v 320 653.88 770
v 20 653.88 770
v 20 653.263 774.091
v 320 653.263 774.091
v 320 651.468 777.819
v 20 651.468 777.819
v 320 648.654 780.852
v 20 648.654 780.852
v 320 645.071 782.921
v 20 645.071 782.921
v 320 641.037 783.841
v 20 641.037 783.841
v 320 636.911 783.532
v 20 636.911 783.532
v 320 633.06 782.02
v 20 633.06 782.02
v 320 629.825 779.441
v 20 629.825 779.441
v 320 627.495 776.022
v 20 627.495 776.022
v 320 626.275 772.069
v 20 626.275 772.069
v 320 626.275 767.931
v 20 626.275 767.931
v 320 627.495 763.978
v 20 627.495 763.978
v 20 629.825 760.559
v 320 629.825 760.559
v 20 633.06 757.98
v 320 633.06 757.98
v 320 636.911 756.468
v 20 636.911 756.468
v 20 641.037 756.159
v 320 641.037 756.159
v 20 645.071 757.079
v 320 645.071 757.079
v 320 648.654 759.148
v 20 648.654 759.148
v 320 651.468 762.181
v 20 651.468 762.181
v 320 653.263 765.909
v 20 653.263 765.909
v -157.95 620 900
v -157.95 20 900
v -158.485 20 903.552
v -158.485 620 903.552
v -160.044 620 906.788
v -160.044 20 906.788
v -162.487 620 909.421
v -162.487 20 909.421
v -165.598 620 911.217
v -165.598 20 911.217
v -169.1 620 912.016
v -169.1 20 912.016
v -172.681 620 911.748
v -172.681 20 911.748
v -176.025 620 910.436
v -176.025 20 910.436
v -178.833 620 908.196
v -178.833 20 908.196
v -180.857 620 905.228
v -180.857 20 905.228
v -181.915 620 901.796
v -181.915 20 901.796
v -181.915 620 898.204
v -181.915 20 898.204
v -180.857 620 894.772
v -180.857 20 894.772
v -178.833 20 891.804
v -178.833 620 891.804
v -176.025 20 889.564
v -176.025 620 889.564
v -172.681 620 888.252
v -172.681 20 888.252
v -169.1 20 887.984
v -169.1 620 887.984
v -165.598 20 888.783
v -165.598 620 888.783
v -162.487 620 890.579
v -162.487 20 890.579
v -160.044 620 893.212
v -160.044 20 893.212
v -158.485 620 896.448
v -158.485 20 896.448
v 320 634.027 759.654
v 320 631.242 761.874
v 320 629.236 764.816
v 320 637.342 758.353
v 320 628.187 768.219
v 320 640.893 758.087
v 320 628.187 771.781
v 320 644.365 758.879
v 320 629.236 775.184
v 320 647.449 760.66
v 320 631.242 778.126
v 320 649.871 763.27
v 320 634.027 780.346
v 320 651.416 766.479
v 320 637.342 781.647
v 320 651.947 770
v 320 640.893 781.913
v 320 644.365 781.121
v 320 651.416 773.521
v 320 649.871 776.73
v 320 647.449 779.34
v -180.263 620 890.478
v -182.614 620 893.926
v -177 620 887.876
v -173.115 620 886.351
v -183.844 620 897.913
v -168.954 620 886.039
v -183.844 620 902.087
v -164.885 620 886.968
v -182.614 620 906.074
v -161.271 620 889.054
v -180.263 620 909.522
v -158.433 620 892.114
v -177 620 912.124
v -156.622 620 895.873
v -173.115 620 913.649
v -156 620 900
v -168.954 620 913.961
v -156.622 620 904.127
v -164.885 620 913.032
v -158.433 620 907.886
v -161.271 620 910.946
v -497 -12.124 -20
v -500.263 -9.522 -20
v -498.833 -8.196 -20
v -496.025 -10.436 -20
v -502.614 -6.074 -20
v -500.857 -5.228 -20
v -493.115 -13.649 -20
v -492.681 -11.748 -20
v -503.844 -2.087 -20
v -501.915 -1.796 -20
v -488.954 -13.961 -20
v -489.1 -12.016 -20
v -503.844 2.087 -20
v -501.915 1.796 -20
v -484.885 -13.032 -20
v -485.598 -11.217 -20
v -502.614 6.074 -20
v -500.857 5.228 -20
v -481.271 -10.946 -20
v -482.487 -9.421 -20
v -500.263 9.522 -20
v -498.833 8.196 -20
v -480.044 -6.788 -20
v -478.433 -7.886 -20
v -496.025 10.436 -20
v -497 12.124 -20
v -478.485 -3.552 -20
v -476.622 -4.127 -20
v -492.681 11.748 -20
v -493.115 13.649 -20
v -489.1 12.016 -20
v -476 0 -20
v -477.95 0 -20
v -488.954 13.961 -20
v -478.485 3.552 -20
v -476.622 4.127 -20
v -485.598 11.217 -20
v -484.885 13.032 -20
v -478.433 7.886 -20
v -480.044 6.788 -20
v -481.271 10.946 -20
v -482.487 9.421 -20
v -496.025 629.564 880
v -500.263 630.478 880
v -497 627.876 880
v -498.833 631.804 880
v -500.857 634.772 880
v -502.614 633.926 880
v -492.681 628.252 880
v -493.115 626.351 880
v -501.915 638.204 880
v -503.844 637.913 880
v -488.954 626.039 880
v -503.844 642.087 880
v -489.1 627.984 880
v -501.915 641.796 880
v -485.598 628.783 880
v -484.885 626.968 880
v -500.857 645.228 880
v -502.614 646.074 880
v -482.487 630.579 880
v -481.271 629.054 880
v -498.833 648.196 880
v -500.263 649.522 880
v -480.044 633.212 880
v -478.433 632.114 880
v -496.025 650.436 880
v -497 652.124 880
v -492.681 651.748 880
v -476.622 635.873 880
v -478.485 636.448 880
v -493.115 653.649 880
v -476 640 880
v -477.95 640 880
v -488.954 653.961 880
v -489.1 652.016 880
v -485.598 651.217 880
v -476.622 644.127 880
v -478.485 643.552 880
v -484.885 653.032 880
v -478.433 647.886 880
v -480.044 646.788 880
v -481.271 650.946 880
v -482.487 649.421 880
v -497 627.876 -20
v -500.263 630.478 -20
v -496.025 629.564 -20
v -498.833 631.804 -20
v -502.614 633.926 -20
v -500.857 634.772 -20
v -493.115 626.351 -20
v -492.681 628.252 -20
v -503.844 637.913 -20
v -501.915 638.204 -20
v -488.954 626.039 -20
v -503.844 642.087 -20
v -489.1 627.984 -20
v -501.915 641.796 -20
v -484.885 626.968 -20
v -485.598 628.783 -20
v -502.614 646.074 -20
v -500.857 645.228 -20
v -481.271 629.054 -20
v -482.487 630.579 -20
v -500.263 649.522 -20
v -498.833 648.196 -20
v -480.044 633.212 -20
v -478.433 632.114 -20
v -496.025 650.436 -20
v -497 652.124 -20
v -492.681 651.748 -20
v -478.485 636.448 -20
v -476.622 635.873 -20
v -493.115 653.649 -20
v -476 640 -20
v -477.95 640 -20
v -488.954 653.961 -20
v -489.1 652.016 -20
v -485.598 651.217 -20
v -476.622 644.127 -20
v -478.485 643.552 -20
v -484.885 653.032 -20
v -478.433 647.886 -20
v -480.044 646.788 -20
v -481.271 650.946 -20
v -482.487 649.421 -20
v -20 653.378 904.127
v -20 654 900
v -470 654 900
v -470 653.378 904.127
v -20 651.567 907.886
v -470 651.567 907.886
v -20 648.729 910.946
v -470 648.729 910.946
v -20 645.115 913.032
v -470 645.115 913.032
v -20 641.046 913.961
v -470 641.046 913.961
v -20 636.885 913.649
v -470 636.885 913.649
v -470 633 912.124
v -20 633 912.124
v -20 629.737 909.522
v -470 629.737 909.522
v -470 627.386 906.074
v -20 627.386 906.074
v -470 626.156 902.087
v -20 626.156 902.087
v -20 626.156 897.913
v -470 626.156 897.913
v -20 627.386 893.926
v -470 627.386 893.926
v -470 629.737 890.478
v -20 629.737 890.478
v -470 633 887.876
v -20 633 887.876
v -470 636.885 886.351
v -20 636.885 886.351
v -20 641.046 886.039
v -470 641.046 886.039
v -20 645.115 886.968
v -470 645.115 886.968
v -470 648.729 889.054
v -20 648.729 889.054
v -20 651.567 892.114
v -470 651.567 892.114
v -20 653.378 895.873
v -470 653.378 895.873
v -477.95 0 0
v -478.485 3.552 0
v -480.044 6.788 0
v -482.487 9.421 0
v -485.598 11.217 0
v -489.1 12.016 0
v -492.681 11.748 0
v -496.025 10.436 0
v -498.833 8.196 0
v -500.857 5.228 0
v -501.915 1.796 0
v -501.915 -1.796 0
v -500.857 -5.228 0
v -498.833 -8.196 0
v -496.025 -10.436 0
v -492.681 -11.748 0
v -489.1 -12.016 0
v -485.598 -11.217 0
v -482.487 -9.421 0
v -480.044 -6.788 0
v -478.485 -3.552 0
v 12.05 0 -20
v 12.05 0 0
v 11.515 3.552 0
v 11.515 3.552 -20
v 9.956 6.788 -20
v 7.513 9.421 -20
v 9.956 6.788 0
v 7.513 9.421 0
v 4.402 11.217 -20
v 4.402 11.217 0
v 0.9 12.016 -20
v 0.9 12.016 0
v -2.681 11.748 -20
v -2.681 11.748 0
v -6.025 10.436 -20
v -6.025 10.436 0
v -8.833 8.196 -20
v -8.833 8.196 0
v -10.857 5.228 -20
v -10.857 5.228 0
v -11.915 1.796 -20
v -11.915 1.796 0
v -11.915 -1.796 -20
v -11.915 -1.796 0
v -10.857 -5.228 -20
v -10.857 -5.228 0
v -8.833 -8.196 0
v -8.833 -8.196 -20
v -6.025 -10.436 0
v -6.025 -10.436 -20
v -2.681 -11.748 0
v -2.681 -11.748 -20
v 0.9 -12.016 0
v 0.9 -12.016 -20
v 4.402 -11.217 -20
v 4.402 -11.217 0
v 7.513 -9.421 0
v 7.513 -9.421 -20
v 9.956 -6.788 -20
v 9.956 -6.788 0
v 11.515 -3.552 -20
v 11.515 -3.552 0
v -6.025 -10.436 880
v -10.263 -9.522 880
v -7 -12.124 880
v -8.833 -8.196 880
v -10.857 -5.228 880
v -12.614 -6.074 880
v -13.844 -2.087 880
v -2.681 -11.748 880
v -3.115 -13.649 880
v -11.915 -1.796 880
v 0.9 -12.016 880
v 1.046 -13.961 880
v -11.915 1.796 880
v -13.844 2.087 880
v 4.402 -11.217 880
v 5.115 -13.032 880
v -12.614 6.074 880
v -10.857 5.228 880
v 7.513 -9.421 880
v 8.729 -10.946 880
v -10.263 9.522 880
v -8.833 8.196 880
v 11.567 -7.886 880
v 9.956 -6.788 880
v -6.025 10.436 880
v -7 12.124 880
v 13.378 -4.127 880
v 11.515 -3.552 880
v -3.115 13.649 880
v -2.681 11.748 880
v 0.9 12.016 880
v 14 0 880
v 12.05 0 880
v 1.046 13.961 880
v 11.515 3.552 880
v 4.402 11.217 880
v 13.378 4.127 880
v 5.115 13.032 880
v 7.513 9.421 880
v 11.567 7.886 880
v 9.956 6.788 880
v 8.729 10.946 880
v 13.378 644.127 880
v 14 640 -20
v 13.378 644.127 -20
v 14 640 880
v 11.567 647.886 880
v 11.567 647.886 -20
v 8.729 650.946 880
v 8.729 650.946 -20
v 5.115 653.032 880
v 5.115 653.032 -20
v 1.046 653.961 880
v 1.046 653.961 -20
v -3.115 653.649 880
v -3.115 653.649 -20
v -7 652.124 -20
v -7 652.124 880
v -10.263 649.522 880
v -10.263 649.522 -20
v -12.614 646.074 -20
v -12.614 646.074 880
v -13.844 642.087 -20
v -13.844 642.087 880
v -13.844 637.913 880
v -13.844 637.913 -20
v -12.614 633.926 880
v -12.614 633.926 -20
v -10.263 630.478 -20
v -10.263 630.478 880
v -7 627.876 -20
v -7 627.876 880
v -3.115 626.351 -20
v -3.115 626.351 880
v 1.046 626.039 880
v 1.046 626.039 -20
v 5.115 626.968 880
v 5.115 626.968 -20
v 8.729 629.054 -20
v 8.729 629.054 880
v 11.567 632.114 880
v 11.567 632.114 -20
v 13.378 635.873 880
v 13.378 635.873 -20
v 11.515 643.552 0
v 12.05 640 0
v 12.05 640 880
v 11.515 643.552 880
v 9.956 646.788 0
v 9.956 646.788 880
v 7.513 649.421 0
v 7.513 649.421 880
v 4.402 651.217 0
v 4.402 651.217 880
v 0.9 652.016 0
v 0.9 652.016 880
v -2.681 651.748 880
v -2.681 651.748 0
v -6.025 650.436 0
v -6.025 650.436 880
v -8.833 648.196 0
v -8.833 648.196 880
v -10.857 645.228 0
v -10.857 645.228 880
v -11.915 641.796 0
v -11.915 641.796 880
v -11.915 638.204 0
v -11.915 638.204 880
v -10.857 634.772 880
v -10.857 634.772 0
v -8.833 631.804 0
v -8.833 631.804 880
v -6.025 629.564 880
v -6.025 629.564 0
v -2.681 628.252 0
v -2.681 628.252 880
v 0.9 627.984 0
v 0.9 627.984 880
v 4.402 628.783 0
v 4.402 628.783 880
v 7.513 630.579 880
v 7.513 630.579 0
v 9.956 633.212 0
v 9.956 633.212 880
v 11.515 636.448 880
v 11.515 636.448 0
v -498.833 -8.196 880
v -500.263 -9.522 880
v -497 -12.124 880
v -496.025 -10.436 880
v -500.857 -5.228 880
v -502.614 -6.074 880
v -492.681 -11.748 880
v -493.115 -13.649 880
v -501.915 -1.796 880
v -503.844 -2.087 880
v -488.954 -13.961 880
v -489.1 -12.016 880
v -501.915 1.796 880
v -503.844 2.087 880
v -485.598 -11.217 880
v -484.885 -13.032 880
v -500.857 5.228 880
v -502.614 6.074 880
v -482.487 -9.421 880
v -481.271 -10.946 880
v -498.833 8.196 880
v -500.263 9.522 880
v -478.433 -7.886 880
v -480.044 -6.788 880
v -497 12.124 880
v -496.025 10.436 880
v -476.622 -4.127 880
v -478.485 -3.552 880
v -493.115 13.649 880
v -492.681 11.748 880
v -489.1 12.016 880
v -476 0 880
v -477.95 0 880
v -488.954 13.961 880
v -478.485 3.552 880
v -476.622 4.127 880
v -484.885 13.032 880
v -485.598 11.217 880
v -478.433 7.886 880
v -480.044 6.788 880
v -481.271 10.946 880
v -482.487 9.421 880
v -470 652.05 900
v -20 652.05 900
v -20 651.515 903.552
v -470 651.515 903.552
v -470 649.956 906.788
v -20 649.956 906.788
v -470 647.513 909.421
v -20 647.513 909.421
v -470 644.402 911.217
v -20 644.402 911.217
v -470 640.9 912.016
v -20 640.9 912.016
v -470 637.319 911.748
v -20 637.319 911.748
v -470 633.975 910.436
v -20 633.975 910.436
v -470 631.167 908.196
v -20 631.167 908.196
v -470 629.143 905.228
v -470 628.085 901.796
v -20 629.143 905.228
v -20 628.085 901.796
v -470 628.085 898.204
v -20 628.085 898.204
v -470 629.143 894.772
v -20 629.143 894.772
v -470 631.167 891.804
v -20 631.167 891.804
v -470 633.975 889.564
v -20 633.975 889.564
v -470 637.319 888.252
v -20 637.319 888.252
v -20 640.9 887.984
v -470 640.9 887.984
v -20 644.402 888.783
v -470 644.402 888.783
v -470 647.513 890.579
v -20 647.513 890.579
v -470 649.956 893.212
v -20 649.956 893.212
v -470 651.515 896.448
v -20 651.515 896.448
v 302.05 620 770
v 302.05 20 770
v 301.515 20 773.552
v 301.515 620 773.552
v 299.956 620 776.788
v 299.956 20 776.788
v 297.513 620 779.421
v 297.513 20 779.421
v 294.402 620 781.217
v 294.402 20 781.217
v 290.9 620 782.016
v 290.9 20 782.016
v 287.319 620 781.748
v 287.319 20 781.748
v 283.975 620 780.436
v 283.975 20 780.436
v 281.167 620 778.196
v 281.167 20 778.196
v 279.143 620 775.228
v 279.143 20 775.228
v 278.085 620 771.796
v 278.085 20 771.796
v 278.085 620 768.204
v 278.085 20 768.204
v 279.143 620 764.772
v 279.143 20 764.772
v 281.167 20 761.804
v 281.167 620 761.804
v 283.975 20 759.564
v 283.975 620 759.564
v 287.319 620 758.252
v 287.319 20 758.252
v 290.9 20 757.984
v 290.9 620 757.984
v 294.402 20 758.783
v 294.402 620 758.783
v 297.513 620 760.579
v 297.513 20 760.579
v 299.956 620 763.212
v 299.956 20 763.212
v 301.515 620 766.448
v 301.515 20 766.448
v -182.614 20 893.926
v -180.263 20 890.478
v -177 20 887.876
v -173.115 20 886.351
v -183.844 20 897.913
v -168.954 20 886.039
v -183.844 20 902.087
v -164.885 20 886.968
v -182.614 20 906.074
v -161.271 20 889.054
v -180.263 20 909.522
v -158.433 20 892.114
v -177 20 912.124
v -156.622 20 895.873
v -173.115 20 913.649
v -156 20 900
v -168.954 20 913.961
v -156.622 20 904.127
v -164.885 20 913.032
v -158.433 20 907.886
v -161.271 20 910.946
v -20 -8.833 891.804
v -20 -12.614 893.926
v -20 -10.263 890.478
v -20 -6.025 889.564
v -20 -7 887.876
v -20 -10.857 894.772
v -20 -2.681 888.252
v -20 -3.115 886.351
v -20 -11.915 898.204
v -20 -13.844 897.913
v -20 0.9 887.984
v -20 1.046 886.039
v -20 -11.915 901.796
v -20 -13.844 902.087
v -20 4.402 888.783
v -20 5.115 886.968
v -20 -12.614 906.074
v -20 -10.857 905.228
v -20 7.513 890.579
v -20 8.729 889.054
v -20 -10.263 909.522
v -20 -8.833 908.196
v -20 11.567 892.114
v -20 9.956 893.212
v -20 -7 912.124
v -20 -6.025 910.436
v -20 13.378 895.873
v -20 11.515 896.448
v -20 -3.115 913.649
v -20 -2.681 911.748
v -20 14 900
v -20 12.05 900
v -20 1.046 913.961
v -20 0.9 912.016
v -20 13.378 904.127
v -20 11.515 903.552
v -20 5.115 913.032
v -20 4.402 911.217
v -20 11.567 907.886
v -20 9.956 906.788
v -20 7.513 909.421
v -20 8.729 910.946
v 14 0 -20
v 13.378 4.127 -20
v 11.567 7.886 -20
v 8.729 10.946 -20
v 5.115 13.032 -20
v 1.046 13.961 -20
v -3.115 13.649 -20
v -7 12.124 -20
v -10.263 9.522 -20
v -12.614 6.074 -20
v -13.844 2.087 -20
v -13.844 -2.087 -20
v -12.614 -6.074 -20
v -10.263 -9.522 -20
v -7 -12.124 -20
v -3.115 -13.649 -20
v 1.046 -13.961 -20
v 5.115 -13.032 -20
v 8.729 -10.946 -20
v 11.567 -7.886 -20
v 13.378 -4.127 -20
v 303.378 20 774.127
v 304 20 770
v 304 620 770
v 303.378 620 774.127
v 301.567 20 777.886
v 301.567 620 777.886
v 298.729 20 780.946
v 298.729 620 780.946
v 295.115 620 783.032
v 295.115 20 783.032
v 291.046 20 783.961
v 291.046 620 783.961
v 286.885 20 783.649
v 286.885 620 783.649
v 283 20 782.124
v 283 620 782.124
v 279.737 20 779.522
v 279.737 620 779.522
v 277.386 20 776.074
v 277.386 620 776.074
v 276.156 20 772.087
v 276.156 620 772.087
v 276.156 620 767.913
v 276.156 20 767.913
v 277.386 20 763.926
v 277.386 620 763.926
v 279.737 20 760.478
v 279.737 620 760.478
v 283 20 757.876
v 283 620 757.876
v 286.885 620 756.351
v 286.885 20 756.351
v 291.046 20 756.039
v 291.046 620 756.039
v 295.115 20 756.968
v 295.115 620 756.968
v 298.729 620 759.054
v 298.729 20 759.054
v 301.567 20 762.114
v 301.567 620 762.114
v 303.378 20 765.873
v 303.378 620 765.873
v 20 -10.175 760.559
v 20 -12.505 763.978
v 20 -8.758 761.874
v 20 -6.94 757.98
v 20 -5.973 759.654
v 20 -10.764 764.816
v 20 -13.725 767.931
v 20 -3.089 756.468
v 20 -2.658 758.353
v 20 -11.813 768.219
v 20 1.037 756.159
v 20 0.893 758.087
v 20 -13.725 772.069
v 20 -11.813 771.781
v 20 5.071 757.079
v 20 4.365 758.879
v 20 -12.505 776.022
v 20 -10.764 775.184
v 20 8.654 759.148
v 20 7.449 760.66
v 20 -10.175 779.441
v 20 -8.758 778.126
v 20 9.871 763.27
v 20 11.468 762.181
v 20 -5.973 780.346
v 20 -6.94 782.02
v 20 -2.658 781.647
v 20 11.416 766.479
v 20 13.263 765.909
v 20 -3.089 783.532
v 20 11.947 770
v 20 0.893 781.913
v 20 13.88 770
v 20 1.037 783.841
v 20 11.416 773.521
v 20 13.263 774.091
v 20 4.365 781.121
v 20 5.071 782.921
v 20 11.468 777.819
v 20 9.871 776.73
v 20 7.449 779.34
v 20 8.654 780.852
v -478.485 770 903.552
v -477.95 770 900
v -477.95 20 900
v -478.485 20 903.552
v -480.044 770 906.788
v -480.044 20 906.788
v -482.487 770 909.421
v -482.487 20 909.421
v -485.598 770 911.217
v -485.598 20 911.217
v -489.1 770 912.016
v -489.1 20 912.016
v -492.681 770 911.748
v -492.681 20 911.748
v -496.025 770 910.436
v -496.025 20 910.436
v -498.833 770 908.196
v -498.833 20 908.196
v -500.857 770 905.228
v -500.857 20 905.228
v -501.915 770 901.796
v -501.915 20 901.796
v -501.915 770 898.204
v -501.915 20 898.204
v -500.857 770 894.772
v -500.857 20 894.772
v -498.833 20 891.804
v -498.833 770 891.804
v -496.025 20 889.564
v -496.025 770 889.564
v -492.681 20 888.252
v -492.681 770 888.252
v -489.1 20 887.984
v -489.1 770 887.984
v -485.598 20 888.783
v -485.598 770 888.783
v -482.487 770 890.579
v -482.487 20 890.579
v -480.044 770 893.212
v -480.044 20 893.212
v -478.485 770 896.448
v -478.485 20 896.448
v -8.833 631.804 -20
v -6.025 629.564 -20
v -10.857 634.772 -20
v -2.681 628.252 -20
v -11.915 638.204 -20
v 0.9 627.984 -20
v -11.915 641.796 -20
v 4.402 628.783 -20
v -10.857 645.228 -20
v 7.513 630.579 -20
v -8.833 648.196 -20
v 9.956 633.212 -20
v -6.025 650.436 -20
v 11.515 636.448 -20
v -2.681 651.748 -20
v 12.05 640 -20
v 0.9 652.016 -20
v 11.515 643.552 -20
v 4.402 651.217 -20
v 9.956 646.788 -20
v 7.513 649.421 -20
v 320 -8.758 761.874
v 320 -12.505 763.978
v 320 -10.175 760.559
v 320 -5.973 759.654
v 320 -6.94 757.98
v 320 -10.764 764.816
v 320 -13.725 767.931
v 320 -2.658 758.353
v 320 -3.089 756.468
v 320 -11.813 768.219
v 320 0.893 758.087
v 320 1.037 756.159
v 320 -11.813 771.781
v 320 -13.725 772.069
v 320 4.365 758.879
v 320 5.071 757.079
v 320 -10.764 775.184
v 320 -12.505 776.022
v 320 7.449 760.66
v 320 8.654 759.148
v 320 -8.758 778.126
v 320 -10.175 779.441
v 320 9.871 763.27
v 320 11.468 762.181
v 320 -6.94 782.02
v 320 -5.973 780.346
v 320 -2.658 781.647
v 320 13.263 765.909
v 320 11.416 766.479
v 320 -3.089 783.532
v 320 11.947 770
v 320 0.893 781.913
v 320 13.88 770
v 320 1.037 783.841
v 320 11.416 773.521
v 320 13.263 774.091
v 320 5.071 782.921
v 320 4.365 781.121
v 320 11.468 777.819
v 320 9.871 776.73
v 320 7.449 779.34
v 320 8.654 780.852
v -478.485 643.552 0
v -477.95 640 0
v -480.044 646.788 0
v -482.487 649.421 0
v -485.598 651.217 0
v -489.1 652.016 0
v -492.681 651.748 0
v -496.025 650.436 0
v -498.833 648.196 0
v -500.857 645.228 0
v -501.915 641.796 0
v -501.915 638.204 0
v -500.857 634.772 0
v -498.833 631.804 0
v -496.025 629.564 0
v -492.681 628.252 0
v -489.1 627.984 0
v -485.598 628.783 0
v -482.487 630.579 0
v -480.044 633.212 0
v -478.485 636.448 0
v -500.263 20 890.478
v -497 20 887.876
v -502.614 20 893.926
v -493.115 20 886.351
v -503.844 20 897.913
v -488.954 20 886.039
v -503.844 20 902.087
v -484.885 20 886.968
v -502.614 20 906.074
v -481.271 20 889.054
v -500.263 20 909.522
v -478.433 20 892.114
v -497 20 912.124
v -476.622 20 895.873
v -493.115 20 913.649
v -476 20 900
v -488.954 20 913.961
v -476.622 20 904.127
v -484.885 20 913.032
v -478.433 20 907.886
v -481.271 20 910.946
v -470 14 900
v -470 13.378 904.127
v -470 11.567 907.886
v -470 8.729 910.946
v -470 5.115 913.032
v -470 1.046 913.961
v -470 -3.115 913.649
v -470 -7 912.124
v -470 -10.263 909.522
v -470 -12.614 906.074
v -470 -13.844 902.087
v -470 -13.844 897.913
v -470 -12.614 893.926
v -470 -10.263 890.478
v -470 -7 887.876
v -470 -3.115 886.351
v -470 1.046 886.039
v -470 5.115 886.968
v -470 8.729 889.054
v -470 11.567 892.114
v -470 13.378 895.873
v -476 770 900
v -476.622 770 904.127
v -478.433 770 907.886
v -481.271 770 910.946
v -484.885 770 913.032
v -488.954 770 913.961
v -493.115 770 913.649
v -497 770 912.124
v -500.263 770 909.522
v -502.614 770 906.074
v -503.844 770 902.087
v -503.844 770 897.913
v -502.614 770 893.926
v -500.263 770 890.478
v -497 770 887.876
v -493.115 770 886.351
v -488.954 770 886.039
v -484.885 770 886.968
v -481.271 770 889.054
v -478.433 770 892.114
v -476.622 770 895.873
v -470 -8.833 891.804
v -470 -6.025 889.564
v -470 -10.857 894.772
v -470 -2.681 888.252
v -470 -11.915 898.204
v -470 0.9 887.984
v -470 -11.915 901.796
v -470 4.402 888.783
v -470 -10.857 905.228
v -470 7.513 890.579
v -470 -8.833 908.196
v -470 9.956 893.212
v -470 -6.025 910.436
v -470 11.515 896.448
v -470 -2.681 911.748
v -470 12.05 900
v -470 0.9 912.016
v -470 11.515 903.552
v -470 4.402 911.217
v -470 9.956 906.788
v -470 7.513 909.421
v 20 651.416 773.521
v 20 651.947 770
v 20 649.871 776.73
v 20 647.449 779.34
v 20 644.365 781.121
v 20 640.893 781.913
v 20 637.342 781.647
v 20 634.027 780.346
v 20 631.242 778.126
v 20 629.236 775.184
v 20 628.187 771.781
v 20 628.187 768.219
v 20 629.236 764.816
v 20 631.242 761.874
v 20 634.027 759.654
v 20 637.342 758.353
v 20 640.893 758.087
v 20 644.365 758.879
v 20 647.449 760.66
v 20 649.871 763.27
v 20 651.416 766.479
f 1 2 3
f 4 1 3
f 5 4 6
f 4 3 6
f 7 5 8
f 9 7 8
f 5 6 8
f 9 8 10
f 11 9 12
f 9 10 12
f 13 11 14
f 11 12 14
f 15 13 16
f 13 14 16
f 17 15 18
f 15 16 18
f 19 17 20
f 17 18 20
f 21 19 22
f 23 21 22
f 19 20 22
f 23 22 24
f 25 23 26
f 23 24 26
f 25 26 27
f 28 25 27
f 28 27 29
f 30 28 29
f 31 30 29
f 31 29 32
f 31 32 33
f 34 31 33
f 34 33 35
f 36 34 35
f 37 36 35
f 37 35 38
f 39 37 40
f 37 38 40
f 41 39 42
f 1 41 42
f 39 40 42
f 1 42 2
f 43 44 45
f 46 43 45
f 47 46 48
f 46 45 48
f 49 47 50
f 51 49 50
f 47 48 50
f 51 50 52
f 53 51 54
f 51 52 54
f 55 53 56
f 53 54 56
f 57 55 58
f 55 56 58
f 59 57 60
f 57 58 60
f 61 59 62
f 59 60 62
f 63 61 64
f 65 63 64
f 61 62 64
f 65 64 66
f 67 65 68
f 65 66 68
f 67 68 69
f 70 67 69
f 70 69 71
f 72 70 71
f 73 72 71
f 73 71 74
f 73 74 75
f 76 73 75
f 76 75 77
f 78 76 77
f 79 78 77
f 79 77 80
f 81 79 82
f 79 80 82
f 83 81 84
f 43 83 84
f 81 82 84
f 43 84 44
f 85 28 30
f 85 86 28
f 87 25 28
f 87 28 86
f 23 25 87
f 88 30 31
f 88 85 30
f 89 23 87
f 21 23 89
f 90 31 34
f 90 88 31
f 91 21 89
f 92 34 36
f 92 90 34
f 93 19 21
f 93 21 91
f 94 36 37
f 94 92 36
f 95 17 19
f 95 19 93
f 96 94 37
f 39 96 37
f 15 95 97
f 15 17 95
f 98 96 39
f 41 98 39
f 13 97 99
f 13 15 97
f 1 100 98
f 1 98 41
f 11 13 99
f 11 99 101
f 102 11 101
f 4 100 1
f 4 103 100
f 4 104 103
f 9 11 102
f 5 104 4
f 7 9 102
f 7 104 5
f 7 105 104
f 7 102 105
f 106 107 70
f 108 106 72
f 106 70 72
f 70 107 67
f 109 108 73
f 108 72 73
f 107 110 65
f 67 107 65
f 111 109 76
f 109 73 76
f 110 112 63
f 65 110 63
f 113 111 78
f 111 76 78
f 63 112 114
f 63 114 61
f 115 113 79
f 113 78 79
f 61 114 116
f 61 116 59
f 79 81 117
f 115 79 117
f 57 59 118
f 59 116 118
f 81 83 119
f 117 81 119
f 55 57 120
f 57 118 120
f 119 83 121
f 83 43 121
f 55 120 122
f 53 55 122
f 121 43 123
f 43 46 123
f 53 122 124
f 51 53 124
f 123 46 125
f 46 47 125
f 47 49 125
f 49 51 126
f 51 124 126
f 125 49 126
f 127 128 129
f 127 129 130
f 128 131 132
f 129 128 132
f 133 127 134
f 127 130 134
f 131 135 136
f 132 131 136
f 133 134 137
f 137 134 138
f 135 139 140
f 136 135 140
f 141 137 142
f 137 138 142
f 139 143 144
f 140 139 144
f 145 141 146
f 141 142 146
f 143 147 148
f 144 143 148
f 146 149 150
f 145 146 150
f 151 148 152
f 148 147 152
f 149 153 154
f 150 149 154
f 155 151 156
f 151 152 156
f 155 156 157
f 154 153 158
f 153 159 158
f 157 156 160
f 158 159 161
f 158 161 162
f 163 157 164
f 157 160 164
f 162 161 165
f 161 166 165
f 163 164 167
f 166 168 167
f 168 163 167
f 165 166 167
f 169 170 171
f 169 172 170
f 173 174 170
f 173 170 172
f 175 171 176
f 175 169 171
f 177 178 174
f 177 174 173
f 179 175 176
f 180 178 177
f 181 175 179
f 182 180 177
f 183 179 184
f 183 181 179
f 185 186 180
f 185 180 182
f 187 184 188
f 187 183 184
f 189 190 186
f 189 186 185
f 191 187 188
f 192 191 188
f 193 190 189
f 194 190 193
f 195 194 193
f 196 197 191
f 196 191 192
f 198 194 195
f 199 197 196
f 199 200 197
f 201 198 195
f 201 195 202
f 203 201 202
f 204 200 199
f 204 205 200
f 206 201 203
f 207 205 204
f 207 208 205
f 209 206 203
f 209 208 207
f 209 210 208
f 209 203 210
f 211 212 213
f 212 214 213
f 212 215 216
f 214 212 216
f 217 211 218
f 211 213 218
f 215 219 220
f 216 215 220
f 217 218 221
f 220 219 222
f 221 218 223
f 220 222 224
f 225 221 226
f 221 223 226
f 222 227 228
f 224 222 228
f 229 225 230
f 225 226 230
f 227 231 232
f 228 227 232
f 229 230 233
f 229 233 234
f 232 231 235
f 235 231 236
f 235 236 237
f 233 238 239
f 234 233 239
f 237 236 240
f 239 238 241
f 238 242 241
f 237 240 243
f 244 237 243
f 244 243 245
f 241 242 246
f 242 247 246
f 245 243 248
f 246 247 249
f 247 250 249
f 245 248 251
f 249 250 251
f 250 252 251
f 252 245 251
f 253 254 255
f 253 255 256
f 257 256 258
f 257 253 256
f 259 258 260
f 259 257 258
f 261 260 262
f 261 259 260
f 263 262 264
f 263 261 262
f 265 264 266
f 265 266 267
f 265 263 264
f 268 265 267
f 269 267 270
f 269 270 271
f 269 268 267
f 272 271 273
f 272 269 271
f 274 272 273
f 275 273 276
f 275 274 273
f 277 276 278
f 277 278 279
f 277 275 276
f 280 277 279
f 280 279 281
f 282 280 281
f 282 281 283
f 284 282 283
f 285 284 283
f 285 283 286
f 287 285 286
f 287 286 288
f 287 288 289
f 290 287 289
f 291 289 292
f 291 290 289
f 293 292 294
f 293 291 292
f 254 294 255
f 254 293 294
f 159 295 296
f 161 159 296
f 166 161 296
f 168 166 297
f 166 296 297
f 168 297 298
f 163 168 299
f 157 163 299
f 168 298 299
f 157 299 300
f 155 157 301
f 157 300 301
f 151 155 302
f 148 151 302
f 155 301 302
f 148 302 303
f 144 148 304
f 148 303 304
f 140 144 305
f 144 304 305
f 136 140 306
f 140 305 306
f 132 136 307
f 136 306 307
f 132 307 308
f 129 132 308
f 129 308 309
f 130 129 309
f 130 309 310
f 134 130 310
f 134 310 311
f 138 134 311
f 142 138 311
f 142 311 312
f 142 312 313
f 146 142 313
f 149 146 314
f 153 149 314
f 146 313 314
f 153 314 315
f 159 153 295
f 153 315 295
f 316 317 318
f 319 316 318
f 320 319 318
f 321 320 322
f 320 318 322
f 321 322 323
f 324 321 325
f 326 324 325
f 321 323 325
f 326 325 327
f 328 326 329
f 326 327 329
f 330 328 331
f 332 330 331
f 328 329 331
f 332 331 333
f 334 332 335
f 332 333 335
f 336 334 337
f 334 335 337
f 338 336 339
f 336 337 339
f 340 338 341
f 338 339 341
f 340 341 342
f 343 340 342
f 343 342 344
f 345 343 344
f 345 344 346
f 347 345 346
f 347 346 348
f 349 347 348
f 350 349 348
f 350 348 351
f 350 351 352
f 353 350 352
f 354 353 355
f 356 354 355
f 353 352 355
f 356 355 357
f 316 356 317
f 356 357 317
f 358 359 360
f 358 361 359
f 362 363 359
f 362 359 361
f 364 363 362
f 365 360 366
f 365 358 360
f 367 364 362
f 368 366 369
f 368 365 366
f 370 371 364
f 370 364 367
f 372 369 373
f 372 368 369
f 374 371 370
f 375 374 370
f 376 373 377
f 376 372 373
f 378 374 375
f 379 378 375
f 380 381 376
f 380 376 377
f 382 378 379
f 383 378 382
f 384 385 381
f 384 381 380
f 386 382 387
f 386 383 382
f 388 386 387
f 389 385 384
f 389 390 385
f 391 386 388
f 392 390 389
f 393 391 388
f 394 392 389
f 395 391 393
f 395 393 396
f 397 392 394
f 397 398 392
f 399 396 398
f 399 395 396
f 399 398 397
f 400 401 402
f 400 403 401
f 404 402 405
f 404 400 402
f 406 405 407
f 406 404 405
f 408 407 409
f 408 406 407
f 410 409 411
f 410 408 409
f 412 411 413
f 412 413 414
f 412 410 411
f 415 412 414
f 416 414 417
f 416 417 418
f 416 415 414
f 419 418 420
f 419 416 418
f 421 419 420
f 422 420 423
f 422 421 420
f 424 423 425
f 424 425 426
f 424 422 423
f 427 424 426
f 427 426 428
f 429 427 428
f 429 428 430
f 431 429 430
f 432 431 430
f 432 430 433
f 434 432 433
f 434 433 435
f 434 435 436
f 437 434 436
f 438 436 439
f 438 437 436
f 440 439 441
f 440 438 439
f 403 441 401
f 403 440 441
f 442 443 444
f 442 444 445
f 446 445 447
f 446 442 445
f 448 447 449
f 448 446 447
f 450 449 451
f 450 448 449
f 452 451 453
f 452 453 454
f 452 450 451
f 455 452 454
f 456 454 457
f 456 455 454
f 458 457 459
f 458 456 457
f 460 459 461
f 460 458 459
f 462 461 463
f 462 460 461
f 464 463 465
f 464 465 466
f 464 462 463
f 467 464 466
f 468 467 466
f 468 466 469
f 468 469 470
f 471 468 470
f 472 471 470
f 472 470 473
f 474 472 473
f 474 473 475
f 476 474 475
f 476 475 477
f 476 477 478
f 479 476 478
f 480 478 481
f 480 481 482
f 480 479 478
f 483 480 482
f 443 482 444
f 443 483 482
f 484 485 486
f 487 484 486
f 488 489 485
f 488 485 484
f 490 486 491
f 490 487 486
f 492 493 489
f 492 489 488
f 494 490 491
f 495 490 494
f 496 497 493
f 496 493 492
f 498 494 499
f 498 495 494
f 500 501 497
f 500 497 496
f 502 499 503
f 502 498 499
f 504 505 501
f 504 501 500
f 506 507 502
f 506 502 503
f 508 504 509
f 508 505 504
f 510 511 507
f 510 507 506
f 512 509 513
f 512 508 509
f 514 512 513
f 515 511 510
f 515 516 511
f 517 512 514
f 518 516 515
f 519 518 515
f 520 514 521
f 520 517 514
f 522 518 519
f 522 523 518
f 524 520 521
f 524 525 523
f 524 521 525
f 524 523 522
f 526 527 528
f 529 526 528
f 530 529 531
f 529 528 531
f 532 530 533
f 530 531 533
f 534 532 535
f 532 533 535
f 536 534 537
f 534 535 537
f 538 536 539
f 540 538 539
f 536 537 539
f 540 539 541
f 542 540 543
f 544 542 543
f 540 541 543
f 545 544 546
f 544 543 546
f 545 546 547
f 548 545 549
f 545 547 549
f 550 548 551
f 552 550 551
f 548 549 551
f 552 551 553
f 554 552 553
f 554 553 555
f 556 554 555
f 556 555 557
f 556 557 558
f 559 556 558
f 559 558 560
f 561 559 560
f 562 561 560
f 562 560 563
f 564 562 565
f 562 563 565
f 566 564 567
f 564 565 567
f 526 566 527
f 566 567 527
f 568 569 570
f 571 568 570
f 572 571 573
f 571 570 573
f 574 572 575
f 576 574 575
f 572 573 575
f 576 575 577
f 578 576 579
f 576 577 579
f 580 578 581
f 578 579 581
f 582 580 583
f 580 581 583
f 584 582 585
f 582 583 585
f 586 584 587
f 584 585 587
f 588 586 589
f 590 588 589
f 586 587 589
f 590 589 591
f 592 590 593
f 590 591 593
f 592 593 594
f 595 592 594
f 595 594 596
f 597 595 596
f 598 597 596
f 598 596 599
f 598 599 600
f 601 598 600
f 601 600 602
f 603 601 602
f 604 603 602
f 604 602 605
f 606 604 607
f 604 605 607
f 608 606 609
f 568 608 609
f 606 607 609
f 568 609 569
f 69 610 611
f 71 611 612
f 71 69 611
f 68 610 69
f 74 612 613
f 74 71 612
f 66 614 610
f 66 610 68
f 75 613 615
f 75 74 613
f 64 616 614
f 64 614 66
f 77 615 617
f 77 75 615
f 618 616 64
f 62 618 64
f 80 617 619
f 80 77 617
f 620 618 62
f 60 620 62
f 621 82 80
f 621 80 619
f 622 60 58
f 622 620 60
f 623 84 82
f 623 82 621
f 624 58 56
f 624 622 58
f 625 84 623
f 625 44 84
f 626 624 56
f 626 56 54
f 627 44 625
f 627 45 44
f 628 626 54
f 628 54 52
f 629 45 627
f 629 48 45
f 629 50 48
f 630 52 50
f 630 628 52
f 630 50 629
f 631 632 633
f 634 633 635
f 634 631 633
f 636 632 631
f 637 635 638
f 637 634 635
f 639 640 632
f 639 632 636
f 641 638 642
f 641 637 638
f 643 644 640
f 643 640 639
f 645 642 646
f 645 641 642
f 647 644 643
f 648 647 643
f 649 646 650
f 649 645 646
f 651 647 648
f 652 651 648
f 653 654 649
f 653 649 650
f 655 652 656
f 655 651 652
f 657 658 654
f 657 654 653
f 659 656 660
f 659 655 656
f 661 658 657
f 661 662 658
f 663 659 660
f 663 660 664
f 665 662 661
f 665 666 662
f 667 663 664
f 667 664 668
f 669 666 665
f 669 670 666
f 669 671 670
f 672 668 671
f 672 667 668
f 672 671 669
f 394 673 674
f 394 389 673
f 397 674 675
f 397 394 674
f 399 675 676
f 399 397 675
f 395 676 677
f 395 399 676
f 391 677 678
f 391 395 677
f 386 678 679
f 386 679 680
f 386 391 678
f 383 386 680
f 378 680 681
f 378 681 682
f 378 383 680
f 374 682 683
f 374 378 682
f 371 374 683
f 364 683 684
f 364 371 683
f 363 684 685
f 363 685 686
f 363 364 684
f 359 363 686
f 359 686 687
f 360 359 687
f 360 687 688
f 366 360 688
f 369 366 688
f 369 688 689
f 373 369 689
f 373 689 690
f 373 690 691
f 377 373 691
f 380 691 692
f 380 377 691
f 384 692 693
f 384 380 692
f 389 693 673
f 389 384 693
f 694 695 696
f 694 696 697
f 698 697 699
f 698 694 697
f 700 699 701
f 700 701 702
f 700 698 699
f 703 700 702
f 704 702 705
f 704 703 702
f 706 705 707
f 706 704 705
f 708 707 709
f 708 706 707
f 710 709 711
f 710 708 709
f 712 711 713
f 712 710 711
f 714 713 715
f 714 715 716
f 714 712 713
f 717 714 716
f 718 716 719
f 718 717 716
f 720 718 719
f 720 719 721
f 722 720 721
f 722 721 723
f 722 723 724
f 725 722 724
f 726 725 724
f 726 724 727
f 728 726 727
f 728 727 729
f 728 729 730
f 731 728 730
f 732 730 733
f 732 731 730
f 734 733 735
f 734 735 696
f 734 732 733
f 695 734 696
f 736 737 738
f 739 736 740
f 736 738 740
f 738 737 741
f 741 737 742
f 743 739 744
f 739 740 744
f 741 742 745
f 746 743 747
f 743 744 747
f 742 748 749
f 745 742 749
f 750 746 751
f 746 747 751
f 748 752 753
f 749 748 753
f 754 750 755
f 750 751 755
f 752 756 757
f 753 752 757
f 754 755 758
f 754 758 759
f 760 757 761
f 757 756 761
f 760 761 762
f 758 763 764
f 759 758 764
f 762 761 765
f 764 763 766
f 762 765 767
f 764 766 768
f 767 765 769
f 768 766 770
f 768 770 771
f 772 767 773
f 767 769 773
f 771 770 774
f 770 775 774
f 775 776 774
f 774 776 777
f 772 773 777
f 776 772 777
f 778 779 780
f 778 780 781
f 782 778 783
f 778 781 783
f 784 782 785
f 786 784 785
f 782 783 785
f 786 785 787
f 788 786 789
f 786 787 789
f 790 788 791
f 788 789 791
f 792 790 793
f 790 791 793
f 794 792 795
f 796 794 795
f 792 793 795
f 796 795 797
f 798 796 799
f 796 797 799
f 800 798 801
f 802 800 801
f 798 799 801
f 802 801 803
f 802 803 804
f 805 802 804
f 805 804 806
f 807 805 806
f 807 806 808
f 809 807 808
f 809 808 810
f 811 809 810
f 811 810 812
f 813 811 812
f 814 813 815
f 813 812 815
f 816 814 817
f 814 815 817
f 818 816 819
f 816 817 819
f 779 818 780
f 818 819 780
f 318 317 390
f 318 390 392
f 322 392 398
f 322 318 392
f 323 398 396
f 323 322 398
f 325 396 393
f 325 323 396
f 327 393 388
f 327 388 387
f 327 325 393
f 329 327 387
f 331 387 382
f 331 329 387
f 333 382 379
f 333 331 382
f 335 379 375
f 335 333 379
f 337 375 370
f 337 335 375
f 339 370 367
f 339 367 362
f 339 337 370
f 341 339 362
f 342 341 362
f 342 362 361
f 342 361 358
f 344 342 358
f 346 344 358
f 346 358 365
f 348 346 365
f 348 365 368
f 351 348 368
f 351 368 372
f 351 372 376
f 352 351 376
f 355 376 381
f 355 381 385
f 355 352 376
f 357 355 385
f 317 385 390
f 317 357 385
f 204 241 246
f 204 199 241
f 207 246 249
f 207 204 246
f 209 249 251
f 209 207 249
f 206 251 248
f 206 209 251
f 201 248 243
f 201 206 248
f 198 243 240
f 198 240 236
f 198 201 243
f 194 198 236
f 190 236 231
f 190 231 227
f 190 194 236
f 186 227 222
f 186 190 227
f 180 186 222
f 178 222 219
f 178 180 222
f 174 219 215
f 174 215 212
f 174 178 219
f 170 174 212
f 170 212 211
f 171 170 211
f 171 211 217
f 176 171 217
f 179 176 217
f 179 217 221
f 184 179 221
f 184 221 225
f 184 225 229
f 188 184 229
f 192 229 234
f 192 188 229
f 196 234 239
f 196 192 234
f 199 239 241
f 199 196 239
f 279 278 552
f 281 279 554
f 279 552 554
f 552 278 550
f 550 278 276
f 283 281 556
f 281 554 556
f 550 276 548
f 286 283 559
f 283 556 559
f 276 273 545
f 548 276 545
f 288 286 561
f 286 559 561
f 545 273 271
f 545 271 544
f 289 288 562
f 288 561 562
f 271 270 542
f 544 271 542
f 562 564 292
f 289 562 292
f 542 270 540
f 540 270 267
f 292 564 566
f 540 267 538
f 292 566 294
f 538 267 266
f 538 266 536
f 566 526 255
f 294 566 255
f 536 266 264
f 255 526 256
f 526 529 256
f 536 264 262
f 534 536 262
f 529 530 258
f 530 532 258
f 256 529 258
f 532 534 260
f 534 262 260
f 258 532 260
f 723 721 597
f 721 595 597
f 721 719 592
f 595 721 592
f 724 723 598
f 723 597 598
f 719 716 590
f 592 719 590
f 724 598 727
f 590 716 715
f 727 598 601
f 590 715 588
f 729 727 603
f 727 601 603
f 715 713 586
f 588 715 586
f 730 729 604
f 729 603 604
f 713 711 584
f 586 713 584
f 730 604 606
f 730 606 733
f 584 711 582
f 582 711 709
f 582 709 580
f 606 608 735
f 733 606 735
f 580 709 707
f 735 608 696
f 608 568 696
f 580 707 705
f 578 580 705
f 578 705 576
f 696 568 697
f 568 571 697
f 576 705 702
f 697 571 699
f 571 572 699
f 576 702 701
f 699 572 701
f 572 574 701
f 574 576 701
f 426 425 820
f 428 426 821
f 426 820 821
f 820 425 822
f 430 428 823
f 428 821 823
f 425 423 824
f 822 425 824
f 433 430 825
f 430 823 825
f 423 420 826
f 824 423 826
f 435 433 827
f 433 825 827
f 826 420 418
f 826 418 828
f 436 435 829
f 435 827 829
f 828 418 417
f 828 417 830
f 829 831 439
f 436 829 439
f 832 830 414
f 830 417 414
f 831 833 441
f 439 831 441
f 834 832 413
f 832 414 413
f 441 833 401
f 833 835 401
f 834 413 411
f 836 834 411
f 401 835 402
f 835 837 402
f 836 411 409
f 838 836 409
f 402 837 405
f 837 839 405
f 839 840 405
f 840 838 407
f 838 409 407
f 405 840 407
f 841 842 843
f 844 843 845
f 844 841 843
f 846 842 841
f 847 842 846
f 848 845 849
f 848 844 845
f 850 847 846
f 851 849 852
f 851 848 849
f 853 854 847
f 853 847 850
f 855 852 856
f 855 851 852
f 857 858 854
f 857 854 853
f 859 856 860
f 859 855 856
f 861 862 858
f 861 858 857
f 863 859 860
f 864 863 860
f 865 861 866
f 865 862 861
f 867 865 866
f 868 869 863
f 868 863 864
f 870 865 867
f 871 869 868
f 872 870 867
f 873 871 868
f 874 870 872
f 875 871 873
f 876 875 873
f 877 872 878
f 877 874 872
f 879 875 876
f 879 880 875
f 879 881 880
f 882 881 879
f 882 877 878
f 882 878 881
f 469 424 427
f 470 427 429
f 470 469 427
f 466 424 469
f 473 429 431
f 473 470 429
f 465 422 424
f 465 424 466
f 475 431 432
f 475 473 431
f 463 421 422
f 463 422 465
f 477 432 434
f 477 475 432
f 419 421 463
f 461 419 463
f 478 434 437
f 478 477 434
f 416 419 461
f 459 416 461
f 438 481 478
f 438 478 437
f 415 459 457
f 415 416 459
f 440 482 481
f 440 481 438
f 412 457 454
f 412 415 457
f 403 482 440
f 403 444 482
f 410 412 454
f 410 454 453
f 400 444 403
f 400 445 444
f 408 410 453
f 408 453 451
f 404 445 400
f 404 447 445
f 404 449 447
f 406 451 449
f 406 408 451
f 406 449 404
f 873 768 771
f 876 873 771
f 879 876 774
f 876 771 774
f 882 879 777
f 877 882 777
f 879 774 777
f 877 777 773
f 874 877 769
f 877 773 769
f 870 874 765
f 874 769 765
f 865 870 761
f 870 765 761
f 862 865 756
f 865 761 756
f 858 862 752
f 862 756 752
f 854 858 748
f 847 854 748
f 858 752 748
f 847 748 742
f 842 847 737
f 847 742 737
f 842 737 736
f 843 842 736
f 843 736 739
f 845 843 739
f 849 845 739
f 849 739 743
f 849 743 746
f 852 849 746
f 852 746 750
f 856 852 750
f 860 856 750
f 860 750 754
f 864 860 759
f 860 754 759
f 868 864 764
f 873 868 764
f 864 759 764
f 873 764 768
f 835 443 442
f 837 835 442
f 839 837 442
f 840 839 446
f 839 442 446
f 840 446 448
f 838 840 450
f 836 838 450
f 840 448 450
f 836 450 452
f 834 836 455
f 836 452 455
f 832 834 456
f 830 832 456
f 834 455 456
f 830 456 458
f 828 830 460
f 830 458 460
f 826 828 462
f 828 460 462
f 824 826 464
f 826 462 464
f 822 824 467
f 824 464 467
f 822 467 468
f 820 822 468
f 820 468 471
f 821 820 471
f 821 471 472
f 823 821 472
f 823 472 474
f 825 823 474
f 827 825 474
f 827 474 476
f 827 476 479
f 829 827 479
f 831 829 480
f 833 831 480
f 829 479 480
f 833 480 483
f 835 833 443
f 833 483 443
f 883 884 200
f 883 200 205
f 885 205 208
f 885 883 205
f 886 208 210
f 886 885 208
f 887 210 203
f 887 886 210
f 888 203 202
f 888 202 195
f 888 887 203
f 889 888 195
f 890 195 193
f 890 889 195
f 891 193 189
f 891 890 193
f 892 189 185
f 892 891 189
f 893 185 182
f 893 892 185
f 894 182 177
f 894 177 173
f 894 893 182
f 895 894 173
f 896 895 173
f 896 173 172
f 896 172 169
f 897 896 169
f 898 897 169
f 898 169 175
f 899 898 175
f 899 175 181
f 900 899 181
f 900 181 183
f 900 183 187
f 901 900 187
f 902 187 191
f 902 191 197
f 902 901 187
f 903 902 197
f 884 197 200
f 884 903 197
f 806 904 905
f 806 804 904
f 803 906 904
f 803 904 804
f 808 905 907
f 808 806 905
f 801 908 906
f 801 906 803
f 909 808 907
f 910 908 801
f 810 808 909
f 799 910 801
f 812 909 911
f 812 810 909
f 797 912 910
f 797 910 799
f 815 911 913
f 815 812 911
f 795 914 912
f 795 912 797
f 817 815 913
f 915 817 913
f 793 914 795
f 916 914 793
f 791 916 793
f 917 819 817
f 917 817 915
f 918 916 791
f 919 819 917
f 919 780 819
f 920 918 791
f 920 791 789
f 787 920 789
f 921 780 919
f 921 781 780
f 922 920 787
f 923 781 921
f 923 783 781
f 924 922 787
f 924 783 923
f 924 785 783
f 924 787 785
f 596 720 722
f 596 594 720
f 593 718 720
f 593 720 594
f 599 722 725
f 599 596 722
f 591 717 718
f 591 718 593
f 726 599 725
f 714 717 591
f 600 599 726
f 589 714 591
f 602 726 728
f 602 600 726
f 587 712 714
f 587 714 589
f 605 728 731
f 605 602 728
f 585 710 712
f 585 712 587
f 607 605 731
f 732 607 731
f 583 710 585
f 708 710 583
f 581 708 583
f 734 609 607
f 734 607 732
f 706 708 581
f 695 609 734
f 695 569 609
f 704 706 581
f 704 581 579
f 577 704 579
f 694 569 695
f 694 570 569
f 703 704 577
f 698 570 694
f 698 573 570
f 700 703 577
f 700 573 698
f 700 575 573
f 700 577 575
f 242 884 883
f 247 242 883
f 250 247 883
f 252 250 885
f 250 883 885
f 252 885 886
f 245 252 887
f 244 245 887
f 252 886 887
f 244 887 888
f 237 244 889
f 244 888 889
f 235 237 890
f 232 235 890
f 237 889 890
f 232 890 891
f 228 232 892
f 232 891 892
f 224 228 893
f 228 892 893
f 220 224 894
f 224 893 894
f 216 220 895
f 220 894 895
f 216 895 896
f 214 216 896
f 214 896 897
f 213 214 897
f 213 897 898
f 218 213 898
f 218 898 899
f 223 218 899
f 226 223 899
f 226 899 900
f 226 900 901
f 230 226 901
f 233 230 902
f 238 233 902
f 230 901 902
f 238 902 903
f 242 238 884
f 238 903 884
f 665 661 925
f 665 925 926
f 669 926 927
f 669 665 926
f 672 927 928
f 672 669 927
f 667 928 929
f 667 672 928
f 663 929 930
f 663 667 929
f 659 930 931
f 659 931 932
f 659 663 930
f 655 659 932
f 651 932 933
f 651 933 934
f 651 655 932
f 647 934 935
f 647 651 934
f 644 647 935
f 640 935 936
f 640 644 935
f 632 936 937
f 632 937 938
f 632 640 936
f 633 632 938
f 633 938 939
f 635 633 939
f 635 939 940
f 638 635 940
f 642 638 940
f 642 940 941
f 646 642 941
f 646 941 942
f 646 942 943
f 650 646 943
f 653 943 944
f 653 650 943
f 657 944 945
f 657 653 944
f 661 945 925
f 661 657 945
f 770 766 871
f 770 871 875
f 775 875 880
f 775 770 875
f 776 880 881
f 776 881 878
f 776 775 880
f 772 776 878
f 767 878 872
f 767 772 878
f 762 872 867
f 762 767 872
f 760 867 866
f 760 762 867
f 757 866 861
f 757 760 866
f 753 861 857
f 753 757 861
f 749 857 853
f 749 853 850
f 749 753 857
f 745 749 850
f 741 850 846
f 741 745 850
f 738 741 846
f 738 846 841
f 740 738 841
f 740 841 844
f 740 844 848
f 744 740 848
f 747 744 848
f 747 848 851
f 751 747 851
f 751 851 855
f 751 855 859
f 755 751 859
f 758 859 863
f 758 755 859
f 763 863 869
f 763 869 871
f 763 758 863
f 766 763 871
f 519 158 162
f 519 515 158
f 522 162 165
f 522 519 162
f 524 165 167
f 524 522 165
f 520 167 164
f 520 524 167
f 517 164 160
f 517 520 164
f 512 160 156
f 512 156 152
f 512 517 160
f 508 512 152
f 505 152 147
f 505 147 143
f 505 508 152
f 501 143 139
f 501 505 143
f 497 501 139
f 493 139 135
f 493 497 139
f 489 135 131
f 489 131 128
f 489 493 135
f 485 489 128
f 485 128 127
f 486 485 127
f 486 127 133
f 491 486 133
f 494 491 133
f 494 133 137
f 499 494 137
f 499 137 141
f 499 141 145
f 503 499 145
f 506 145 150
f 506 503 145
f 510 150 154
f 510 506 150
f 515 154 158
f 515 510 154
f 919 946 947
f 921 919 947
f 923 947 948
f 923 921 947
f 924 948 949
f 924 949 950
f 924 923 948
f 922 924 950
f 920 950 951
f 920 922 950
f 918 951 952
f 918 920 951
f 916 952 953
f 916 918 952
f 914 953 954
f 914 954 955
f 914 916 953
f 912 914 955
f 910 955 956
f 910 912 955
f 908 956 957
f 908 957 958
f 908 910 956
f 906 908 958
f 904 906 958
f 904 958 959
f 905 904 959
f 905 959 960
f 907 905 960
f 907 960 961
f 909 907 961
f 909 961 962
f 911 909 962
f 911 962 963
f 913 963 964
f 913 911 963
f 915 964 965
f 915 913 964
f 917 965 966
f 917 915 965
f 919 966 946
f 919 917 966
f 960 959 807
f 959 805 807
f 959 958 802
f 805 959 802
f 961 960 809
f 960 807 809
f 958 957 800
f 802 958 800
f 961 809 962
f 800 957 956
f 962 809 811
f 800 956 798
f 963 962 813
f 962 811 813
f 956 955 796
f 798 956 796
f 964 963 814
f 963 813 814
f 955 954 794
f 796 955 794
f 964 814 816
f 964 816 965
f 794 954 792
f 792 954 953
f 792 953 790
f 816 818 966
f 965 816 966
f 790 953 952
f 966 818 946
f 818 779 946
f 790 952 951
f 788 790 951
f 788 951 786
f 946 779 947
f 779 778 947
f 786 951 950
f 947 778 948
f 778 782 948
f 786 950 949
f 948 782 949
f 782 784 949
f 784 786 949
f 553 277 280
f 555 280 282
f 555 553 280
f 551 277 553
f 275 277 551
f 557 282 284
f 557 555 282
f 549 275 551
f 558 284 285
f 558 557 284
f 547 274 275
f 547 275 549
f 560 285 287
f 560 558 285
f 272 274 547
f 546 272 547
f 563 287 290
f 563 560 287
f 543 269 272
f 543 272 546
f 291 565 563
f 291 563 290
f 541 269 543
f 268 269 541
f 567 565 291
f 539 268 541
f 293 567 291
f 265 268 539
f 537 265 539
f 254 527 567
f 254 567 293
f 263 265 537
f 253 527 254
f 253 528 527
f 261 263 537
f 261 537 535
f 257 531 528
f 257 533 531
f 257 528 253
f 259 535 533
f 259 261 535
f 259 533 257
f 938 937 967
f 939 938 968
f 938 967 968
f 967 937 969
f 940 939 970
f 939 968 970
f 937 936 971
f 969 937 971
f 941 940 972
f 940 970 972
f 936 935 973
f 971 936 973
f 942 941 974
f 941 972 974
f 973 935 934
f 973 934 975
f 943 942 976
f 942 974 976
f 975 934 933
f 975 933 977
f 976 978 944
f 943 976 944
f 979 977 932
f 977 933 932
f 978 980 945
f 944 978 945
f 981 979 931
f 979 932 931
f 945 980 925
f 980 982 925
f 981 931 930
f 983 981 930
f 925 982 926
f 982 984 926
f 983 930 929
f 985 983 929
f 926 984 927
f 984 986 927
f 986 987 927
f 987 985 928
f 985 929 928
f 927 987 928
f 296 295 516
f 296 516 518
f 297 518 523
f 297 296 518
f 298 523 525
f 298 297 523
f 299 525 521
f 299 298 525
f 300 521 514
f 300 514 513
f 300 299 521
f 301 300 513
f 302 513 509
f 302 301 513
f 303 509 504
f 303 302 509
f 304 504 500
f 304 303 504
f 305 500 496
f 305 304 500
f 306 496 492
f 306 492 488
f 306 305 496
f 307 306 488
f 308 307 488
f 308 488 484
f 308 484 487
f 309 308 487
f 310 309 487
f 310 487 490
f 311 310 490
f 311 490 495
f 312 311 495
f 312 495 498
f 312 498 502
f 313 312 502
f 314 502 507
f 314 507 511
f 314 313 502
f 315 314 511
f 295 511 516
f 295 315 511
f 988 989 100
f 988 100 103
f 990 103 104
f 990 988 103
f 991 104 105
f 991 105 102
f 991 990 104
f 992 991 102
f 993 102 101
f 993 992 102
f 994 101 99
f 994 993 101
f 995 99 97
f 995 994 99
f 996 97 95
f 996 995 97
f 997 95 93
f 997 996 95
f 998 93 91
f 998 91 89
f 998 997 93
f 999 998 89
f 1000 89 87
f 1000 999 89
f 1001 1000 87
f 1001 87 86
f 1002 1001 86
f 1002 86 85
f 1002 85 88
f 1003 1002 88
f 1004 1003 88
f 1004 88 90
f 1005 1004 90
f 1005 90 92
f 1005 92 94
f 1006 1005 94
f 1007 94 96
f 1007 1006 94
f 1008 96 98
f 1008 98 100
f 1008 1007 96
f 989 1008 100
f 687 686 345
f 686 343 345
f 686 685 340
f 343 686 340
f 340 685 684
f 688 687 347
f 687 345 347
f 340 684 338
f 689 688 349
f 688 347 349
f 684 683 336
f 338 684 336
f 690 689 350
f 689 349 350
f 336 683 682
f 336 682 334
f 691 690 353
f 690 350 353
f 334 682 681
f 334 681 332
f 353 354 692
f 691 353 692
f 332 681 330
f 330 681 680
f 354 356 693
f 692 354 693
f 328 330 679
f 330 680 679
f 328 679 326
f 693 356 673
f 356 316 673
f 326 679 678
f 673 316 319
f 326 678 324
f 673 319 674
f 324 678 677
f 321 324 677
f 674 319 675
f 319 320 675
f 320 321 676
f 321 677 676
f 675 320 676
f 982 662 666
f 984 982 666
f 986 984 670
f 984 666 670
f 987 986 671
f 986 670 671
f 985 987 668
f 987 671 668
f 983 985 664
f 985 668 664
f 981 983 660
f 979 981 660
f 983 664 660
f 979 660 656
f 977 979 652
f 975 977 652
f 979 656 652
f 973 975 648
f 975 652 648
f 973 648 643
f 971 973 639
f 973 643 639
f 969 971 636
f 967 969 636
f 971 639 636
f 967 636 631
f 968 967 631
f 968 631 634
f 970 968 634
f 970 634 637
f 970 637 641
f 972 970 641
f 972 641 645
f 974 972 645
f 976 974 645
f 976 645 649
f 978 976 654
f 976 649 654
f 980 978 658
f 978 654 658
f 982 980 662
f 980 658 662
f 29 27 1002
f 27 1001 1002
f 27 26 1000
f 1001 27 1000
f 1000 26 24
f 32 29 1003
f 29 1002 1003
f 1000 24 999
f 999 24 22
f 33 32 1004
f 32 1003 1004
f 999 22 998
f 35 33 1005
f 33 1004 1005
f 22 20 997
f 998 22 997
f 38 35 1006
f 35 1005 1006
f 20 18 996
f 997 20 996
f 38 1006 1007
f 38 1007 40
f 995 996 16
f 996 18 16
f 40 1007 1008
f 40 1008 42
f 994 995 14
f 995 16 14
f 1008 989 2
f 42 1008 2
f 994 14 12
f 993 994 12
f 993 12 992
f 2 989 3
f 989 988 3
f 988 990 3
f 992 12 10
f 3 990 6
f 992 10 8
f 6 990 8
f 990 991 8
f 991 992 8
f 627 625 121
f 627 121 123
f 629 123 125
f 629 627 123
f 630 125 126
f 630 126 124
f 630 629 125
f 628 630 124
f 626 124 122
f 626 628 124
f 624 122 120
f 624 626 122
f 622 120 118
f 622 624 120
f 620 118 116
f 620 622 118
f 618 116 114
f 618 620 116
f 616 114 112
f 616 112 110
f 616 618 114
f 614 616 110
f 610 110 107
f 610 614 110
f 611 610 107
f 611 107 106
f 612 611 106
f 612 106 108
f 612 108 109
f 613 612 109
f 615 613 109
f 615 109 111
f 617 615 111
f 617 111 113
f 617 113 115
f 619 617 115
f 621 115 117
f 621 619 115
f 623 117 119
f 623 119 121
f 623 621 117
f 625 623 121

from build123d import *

# Parameters (mm, degrees)
F0_R          = 14
F0_R_2        = 12.05
F1_DEPTH      = 880
F1_DEPTH_BACK = 20
F3_START      = -20
F2_R          = 14
F2_R_2        = 12.05
F3_DEPTH      = 600
F5_START      = -20
F4_R          = 14
F4_R_2        = 12.05
F5_DEPTH      = 450
F7_START      = 20
F6_R          = 13.8800494928
F6_R_2        = 11.9467568849
F7_DEPTH      = 300
F8_DEPTH      = 150


with BuildPart() as f1:
    # F0 (on Top) → F1 (new body, two sides)
    with BuildSketch(Plane.XY) as f1_sk:
        Circle(F0_R)
        Circle(F0_R_2, mode=Mode.SUBTRACT)
    extrude(amount=F1_DEPTH)
    extrude(f1_sk.sketch, amount=-F1_DEPTH_BACK)


with BuildPart() as f1b:
    # F0 (on Top) → F1, piece 2 (new body, two sides)
    with BuildSketch(Plane.XY) as f1_2_sk:
        with Locations((0, 640)):
            Circle(F0_R)
        with Locations((0, 640)):
            Circle(F0_R_2, mode=Mode.SUBTRACT)
    extrude(amount=F1_DEPTH)
    extrude(f1_2_sk.sketch, amount=-F1_DEPTH_BACK)


with BuildPart() as f1c:
    # F0 (on Top) → F1, piece 3 (new body, two sides)
    with BuildSketch(Plane.XY) as f1_3_sk:
        with Locations((-490, 0)):
            Circle(F0_R)
        with Locations((-490, 0)):
            Circle(F0_R_2, mode=Mode.SUBTRACT)
    extrude(amount=F1_DEPTH)
    extrude(f1_3_sk.sketch, amount=-F1_DEPTH_BACK)


with BuildPart() as f1d:
    # F0 (on Top) → F1, piece 4 (new body, two sides)
    with BuildSketch(Plane.XY) as f1_4_sk:
        with Locations((-490, 640)):
            Circle(F0_R)
        with Locations((-490, 640)):
            Circle(F0_R_2, mode=Mode.SUBTRACT)
    extrude(amount=F1_DEPTH)
    extrude(f1_4_sk.sketch, amount=-F1_DEPTH_BACK)


with BuildPart() as f3:
    # F2 (on Front) → F3 (new body)
    with BuildSketch(Plane.XZ.offset(F3_START)):
        with Locations((290, 770)):
            Circle(F2_R)
        with Locations((290, 770)):
            Circle(F2_R_2, mode=Mode.SUBTRACT)
    extrude(amount=-F3_DEPTH)


with BuildPart() as f3b:
    # F2 (on Front) → F3, piece 2 (new body)
    with BuildSketch(Plane.XZ.offset(F3_START)):
        with Locations((-170, 900)):
            Circle(F2_R)
        with Locations((-170, 900)):
            Circle(F2_R_2, mode=Mode.SUBTRACT)
    extrude(amount=-F3_DEPTH)


with BuildPart() as f3c:
    # F2 (on Front) → F3, piece 3 (new body)
    with BuildSketch(Plane.XZ.offset(F3_START)):
        with Locations((-490, 900)):
            Circle(F2_R)
        with Locations((-490, 900)):
            Circle(F2_R_2, mode=Mode.SUBTRACT)
    extrude(amount=-F3_DEPTH)

    # F8 (add): a face of the model
    f8_faces = [f3c.faces().sort_by_distance(p)[0] for p in [
        (-503.6040202025, 620, 900),
    ]]
    extrude(f8_faces, amount=F8_DEPTH)


with BuildPart() as f5:
    # F4 (on Right) → F5 (new body)
    with BuildSketch(Plane.YZ.offset(F5_START)):
        with Locations((640, 900)):
            Circle(F4_R)
        with Locations((640, 900)):
            Circle(F4_R_2, mode=Mode.SUBTRACT)
    extrude(amount=-F5_DEPTH)


with BuildPart() as f5b:
    # F4 (on Right) → F5, piece 2 (new body)
    with BuildSketch(Plane.YZ.offset(F5_START)):
        with Locations((0, 900)):
            Circle(F4_R)
        with Locations((0, 900)):
            Circle(F4_R_2, mode=Mode.SUBTRACT)
    extrude(amount=-F5_DEPTH)


with BuildPart() as f7:
    # F6 (on Right) → F7 (new body)
    with BuildSketch(Plane.YZ.offset(F7_START)):
        with Locations((0, 770)):
            Circle(F6_R)
        with Locations((0, 770)):
            Circle(F6_R_2, mode=Mode.SUBTRACT)
    extrude(amount=F7_DEPTH)


with BuildPart() as f7b:
    # F6 (on Right) → F7, piece 2 (new body)
    with BuildSketch(Plane.YZ.offset(F7_START)):
        with Locations((640, 770)):
            Circle(F6_R)
        with Locations((640, 770)):
            Circle(F6_R_2, mode=Mode.SUBTRACT)
    extrude(amount=F7_DEPTH)


solid = Compound([f1.part, f1b.part, f1c.part, f1d.part, f3.part, f3b.part, f3c.part, f5.part, f5b.part, f7.part, f7b.part])
